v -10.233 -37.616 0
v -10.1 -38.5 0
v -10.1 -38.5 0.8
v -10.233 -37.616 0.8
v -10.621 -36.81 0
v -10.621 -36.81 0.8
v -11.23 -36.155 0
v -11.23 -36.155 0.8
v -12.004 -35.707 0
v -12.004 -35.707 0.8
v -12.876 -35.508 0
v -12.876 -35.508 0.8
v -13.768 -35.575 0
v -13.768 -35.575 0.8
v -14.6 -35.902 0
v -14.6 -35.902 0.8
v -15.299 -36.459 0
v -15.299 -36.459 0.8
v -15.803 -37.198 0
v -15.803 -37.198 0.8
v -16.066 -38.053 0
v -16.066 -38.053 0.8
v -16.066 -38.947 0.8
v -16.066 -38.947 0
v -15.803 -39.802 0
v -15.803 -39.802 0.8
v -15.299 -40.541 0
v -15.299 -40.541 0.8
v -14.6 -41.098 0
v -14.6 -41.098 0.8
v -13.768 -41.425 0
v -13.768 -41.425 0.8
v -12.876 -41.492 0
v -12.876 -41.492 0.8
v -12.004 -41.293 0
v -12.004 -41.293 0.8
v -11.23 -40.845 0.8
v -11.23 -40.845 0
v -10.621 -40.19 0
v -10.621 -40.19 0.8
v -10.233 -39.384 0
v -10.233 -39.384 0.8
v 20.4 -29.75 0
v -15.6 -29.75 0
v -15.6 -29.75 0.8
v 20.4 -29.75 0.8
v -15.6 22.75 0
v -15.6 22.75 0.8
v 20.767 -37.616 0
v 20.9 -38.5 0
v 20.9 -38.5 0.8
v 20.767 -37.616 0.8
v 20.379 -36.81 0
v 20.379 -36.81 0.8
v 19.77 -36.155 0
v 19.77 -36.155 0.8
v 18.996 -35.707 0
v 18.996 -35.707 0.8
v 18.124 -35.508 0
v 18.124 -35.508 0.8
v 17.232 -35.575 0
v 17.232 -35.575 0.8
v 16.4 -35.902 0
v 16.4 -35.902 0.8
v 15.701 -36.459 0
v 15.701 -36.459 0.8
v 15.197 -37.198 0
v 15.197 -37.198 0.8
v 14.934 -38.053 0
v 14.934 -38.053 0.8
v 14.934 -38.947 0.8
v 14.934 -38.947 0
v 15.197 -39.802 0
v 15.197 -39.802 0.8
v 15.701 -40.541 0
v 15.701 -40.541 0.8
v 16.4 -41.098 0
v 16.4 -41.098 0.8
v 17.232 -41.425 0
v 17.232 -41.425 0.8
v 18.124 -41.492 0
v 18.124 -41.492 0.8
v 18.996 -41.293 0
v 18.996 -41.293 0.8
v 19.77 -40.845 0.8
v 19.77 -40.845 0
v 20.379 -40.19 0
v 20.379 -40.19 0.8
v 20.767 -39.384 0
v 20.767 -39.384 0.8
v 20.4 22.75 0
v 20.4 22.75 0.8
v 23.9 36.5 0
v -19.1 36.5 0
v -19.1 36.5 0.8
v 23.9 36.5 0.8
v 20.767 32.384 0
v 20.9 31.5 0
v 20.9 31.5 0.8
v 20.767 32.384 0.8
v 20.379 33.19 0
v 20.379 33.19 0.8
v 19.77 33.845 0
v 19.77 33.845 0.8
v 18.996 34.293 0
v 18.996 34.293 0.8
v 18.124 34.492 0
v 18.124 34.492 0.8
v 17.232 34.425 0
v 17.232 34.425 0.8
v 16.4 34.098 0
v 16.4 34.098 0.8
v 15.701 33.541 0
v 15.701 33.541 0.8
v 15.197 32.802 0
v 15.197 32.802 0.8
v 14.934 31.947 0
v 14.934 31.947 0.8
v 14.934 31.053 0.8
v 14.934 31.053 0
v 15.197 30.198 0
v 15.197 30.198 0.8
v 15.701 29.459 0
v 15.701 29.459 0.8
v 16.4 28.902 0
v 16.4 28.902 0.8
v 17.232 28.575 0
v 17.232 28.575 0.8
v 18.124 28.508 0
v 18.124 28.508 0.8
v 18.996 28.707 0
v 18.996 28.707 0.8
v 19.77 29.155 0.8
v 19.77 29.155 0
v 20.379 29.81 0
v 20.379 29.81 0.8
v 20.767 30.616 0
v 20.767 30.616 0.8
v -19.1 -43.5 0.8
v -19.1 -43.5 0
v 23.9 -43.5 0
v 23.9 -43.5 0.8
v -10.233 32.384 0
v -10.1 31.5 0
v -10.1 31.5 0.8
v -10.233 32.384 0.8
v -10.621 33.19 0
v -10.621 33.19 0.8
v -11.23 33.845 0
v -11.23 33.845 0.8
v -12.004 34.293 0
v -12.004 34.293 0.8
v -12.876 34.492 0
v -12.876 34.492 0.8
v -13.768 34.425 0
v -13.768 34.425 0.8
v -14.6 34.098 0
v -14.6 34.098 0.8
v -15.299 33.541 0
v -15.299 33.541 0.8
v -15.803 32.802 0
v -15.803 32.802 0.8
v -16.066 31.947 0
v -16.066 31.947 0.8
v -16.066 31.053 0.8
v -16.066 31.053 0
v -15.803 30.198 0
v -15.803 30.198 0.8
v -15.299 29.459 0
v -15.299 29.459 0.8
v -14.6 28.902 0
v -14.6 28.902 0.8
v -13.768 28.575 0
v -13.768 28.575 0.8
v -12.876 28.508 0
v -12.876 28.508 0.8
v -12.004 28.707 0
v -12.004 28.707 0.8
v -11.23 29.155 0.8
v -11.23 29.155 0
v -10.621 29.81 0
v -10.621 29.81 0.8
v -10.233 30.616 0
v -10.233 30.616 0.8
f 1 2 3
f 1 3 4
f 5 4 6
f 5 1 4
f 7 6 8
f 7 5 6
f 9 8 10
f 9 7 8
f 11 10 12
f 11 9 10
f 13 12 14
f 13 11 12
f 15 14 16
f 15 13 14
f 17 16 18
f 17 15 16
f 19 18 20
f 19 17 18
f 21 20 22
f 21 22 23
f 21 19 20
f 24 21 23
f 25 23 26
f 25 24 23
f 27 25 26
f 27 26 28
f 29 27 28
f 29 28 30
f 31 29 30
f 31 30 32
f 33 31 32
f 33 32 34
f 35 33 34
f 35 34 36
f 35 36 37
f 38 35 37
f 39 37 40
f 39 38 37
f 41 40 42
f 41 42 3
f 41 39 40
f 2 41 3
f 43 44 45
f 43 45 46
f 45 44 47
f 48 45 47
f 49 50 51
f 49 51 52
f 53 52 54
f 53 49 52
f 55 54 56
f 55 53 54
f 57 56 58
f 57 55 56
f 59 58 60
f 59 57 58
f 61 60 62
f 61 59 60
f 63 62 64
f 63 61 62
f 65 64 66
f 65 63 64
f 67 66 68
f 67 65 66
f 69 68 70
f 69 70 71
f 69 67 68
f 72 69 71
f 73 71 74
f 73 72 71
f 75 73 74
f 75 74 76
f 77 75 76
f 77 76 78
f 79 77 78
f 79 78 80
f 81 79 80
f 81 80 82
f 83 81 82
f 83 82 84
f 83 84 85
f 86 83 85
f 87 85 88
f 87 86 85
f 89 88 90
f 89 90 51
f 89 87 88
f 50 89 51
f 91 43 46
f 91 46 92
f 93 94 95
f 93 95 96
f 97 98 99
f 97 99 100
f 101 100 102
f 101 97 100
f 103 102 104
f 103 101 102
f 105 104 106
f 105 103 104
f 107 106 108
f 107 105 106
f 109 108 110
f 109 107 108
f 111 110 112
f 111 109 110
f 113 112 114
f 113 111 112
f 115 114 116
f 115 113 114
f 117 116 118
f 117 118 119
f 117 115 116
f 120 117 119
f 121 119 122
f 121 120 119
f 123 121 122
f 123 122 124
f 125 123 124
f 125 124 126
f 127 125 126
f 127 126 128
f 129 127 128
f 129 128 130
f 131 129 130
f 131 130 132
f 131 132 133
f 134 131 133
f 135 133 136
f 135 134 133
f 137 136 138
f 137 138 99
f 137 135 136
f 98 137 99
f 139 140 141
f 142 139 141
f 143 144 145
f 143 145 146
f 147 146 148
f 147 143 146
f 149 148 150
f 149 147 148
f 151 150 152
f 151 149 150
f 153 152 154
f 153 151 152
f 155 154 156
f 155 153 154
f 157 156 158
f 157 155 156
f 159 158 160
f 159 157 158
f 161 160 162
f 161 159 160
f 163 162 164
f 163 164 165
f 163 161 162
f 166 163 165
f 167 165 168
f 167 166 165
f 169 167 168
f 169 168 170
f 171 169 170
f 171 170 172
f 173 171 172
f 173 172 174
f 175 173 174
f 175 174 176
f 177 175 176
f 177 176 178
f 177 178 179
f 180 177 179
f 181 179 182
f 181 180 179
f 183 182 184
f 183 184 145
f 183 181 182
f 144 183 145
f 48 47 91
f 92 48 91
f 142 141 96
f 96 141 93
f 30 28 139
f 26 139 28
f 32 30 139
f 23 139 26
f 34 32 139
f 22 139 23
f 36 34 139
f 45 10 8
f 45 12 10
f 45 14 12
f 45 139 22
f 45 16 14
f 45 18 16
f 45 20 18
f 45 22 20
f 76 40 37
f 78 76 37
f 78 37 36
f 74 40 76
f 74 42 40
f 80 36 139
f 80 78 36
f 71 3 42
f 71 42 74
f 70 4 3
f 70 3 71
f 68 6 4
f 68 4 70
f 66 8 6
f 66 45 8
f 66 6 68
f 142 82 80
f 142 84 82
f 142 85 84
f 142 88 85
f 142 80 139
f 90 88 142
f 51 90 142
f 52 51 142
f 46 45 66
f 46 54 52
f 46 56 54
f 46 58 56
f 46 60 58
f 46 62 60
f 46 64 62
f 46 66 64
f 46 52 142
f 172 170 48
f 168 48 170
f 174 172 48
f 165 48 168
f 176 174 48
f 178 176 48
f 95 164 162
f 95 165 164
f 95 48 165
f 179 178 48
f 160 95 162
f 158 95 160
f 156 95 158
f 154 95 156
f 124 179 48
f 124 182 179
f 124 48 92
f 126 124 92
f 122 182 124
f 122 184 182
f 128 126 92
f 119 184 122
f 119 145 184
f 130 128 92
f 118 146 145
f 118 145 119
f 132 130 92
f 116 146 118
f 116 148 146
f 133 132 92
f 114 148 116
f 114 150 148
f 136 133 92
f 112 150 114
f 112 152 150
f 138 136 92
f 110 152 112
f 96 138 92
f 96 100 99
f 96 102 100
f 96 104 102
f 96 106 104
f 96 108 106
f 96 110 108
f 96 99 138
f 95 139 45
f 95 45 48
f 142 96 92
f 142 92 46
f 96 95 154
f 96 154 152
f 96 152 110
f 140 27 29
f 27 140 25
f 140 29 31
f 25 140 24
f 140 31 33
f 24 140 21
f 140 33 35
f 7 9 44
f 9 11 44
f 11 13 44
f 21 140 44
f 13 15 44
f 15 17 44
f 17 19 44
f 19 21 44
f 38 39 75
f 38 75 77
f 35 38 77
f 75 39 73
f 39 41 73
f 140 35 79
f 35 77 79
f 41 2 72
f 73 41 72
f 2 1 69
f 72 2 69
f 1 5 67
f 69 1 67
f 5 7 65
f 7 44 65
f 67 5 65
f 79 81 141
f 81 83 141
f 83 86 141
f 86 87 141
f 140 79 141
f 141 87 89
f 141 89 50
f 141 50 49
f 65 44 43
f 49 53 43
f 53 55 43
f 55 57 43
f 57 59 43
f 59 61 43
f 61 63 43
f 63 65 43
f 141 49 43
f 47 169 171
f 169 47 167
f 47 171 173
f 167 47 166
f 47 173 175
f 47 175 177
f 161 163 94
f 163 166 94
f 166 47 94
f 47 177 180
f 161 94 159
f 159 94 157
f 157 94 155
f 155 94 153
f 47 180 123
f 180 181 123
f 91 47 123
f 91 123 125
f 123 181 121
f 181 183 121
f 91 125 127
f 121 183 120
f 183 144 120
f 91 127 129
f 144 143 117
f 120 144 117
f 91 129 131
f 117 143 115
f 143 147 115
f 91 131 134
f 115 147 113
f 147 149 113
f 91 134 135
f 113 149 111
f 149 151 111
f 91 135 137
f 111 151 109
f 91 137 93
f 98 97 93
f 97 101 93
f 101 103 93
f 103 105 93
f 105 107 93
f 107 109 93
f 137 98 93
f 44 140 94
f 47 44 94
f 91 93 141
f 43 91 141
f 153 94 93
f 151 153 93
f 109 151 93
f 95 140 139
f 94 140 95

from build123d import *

# Parameters (mm, degrees)
F0_W     = 43
F0_H     = 80
F0_R     = 3
F0_W_2   = 36
F0_H_2   = 52.5
F1_DEPTH = 0.8


with BuildPart() as f1:
    # F0 (on Top) → F1 (new body)
    with BuildSketch(Plane.XY):
        with Locations((2.4, -3.5)):
            Rectangle(F0_W, F0_H)
        with Locations((-13.1, -38.5)):
            Circle(F0_R, mode=Mode.SUBTRACT)
        with Locations((17.9, -38.5)):
            Circle(F0_R, mode=Mode.SUBTRACT)
        with Locations((-13.1, 31.5)):
            Circle(F0_R, mode=Mode.SUBTRACT)
        with Locations((2.4, -3.5)):
            Rectangle(F0_W_2, F0_H_2, mode=Mode.SUBTRACT)
        with Locations((17.9, 31.5)):
            Circle(F0_R, mode=Mode.SUBTRACT)
    extrude(amount=F1_DEPTH)


solid = f1.part
